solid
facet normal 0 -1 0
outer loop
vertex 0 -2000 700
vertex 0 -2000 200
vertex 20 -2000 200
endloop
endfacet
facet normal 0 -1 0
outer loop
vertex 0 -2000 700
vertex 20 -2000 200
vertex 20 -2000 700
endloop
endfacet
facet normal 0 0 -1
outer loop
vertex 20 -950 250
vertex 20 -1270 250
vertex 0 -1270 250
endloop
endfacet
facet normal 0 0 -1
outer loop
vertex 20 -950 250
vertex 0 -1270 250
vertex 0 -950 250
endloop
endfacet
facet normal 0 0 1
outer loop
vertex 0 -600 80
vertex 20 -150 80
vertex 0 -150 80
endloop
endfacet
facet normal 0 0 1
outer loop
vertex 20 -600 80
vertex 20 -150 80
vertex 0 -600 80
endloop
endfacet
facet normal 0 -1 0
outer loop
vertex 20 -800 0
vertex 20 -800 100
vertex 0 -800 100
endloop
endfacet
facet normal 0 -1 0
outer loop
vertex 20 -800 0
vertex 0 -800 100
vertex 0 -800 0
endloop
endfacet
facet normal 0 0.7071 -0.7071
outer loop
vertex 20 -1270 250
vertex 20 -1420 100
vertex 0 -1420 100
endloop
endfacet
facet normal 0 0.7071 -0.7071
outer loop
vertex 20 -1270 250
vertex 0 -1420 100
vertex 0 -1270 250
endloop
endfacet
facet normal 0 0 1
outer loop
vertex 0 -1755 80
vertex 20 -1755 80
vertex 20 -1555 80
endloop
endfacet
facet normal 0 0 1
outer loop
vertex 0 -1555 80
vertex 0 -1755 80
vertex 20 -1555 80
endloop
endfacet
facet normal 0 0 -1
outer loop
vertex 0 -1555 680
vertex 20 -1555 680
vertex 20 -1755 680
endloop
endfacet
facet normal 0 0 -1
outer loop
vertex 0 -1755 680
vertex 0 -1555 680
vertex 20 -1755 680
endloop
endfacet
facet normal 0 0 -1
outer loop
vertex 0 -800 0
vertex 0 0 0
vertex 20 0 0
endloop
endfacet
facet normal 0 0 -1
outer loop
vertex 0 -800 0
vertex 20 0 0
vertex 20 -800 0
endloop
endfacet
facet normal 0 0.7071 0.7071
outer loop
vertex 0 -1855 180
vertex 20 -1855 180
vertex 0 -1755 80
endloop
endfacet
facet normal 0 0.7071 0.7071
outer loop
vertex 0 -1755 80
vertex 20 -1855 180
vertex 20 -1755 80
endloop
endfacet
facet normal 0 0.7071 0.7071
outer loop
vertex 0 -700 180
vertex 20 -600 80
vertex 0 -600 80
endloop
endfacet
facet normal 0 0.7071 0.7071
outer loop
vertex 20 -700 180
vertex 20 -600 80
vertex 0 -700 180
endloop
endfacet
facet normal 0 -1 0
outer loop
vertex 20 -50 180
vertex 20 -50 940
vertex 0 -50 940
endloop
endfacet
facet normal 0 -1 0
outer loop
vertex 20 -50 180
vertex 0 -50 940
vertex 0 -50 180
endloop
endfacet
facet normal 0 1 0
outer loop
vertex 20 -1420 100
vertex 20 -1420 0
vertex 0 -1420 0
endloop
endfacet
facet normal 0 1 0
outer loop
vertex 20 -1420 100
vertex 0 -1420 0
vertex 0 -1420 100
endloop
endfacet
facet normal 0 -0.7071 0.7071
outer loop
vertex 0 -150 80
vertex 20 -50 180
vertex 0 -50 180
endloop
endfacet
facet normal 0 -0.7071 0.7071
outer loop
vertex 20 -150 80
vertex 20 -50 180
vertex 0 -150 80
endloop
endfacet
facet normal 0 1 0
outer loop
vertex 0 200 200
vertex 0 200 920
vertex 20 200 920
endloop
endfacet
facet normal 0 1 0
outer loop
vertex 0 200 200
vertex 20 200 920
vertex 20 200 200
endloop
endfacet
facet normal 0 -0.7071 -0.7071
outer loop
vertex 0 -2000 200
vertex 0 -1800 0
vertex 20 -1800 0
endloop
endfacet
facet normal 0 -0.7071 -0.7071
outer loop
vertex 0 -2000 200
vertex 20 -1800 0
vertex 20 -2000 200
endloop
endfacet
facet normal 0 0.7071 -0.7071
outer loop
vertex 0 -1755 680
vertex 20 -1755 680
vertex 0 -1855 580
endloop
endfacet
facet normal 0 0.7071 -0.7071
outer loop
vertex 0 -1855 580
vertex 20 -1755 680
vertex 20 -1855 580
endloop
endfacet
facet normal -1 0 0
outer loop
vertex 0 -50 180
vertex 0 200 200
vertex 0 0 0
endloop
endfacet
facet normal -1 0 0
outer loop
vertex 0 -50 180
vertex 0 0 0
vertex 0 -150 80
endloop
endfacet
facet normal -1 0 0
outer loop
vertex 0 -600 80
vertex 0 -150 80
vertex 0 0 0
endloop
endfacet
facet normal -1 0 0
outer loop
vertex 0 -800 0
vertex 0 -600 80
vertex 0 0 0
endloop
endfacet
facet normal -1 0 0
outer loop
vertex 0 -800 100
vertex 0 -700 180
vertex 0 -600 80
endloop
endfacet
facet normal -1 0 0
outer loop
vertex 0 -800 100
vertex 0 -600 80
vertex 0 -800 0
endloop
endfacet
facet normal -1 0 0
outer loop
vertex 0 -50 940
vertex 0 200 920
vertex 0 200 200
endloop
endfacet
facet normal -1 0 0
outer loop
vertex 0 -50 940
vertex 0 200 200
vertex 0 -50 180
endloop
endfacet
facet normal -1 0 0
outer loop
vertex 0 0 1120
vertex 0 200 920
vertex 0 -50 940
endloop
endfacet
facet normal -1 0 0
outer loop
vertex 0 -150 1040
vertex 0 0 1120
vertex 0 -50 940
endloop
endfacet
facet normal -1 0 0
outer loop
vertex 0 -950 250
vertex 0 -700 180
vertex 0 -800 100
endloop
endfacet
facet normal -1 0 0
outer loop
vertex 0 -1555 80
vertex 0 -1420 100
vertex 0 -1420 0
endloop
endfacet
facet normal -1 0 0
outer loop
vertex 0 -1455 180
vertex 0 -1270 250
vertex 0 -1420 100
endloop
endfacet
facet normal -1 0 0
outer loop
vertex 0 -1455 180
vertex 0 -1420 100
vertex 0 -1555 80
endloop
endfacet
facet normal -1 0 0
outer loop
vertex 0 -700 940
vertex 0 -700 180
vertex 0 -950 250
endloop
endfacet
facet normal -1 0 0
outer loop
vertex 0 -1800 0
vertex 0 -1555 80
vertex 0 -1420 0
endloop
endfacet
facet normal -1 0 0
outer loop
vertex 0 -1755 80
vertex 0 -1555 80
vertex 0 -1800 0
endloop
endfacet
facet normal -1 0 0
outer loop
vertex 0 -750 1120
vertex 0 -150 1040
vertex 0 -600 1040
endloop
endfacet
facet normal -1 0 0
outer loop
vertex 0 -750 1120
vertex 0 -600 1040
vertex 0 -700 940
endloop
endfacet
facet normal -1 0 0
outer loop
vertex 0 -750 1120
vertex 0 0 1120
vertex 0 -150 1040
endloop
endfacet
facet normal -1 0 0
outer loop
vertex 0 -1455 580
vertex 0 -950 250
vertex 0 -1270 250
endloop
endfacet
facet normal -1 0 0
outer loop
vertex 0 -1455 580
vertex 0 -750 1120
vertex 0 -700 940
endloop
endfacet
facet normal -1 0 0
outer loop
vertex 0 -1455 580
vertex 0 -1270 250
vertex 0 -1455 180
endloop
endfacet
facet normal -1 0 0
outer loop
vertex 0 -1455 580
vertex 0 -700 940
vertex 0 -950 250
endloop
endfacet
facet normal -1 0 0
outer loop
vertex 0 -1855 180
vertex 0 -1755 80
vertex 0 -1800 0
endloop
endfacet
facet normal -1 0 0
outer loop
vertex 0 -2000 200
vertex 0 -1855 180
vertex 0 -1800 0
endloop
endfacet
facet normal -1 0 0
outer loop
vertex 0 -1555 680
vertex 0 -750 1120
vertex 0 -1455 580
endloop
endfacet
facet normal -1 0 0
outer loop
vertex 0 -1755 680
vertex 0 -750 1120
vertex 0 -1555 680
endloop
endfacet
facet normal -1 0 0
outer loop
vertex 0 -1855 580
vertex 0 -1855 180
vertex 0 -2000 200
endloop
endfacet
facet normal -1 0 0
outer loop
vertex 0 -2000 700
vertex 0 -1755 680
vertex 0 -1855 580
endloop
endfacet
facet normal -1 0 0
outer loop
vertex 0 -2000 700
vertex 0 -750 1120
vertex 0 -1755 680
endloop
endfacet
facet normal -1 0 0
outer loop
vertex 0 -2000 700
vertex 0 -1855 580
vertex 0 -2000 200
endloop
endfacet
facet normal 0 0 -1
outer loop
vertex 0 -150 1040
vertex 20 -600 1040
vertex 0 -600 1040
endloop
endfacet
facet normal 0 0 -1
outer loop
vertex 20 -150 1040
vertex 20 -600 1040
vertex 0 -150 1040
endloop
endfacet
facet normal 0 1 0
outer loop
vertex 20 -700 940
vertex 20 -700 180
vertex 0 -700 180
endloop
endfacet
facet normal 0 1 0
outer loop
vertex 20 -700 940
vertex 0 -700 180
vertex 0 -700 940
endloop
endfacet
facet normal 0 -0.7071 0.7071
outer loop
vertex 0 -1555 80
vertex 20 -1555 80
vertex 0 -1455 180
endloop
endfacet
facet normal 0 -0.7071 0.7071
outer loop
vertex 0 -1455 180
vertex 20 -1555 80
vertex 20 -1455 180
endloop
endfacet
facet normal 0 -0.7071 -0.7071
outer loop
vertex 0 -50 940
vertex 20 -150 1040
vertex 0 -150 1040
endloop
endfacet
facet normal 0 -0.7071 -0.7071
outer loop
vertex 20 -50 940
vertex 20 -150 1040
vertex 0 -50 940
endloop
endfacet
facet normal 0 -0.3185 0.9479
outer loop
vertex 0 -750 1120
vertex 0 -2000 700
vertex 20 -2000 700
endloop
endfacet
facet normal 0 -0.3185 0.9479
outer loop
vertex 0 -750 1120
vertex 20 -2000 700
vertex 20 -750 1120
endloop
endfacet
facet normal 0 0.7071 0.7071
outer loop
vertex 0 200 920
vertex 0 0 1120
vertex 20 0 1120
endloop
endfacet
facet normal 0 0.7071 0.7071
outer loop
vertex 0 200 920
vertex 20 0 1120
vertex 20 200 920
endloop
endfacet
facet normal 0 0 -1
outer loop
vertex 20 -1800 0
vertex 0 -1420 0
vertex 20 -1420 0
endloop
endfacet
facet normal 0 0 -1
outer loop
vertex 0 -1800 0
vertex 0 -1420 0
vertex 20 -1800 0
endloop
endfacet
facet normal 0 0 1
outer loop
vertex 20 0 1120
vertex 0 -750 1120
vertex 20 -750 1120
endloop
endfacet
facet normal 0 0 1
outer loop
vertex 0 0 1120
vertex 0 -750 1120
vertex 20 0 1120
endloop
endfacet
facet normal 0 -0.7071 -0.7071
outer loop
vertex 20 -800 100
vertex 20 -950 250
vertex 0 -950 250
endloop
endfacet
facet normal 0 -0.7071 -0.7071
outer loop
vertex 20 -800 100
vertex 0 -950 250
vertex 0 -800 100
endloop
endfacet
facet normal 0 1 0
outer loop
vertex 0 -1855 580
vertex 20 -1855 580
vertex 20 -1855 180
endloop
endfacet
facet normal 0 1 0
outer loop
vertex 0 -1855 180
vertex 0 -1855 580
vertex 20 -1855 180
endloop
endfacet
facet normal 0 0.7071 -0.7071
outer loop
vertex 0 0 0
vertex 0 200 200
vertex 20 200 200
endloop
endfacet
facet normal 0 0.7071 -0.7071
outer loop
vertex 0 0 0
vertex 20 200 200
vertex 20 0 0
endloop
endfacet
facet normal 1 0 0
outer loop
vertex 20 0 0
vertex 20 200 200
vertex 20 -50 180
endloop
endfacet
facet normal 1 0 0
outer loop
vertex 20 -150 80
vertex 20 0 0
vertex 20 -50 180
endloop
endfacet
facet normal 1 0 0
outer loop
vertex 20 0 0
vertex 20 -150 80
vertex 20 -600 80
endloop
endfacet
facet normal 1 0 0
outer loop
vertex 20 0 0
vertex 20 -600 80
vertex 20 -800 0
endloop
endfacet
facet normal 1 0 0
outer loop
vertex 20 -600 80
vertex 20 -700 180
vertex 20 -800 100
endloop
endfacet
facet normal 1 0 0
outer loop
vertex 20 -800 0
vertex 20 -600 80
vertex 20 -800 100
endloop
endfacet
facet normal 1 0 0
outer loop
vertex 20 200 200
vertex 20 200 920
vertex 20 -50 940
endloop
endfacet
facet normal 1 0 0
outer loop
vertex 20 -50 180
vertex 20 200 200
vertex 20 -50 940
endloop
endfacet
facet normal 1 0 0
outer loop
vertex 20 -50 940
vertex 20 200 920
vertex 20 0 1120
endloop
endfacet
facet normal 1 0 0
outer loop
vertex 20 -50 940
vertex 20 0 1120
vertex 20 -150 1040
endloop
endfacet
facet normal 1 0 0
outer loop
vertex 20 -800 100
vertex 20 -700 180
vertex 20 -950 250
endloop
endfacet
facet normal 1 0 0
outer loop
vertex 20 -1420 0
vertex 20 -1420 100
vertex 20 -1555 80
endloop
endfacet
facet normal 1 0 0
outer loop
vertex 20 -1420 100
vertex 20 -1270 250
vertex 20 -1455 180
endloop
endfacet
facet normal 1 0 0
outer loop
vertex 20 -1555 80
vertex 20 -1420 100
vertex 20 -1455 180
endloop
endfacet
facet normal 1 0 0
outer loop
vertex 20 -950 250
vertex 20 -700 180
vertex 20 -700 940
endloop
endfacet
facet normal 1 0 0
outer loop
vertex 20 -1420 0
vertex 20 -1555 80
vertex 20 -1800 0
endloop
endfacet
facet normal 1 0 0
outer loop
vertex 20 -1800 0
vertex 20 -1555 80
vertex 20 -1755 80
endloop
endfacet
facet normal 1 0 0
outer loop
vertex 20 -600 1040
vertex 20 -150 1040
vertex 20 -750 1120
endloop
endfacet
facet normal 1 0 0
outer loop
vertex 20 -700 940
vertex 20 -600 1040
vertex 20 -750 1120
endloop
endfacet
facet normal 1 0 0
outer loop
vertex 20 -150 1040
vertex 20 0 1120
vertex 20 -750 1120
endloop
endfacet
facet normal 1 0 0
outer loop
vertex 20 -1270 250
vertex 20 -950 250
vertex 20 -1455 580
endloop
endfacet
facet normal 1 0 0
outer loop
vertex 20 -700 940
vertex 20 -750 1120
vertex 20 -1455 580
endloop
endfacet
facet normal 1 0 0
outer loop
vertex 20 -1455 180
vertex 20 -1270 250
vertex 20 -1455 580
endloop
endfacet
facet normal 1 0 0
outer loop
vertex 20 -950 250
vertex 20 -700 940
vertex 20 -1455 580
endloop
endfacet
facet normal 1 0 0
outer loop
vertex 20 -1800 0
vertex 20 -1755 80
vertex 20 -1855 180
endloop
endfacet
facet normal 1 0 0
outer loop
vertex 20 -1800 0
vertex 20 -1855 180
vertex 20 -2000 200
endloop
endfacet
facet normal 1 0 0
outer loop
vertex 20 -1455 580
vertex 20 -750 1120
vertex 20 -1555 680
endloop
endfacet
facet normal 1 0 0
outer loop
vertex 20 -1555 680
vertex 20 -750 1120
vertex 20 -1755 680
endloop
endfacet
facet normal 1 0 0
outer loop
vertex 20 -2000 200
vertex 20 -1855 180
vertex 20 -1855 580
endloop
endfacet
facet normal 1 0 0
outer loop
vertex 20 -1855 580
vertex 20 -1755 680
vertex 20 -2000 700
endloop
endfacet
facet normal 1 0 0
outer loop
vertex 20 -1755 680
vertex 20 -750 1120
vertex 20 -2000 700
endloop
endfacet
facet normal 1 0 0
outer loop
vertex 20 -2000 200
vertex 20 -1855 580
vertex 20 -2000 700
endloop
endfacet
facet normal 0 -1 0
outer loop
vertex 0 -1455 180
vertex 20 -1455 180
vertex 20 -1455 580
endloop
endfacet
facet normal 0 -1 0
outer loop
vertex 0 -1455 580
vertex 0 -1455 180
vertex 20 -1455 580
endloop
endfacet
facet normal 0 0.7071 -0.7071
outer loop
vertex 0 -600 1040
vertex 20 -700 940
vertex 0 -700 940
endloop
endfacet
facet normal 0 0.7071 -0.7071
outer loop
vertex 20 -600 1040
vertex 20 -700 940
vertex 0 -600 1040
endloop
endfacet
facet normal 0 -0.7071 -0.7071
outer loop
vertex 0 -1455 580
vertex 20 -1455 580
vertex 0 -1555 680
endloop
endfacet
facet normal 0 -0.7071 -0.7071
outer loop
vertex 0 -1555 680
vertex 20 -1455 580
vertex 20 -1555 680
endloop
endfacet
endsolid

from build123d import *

# Parameters (mm, degrees)
PAD_DEPTH       = 20
POCKET_DEPTH    = 20
POCKET001_DEPTH = 20
POCKET002_DEPTH = 20


with BuildPart() as part:
    # Sketch → Pad (new body)
    with BuildSketch(Plane.YZ):
        Polygon((-2000, 200), (-2000, 700), (-750, 1120), (0, 1120), (200, 920), (200, 200), (0, 0), (-1800, 0), align=None)
    extrude(amount=PAD_DEPTH)

    # Sketch001 (on Face10 of Pad) → Pocket (cut)
    with BuildSketch(Plane.YZ.offset(20)):
        Polygon((-600, 1040), (-150, 1040), (-50, 940), (-50, 180), (-150, 80), (-600, 80), (-700, 180), (-700, 940), align=None)
    extrude(amount=-POCKET_DEPTH, mode=Mode.SUBTRACT)

    # Sketch002 (on Face5 of Pocket) → Pocket001 (cut)
    with BuildSketch(Plane.YZ.offset(20)):
        Polygon((-1270, 250), (-950, 250), (-800, 100), (-800, 0), (-1420, 0), (-1420, 100), align=None)
    extrude(amount=-POCKET001_DEPTH, mode=Mode.SUBTRACT)

    # Sketch003 (on Face5 of Pocket001) → Pocket002 (cut)
    with BuildSketch(Plane.YZ.offset(20)):
        Polygon((-1755, 80), (-1555, 80), (-1455, 180), (-1455, 580), (-1555, 680), (-1755, 680), (-1855, 580), (-1855, 180), align=None)
    extrude(amount=-POCKET002_DEPTH, mode=Mode.SUBTRACT)


solid = part.part
